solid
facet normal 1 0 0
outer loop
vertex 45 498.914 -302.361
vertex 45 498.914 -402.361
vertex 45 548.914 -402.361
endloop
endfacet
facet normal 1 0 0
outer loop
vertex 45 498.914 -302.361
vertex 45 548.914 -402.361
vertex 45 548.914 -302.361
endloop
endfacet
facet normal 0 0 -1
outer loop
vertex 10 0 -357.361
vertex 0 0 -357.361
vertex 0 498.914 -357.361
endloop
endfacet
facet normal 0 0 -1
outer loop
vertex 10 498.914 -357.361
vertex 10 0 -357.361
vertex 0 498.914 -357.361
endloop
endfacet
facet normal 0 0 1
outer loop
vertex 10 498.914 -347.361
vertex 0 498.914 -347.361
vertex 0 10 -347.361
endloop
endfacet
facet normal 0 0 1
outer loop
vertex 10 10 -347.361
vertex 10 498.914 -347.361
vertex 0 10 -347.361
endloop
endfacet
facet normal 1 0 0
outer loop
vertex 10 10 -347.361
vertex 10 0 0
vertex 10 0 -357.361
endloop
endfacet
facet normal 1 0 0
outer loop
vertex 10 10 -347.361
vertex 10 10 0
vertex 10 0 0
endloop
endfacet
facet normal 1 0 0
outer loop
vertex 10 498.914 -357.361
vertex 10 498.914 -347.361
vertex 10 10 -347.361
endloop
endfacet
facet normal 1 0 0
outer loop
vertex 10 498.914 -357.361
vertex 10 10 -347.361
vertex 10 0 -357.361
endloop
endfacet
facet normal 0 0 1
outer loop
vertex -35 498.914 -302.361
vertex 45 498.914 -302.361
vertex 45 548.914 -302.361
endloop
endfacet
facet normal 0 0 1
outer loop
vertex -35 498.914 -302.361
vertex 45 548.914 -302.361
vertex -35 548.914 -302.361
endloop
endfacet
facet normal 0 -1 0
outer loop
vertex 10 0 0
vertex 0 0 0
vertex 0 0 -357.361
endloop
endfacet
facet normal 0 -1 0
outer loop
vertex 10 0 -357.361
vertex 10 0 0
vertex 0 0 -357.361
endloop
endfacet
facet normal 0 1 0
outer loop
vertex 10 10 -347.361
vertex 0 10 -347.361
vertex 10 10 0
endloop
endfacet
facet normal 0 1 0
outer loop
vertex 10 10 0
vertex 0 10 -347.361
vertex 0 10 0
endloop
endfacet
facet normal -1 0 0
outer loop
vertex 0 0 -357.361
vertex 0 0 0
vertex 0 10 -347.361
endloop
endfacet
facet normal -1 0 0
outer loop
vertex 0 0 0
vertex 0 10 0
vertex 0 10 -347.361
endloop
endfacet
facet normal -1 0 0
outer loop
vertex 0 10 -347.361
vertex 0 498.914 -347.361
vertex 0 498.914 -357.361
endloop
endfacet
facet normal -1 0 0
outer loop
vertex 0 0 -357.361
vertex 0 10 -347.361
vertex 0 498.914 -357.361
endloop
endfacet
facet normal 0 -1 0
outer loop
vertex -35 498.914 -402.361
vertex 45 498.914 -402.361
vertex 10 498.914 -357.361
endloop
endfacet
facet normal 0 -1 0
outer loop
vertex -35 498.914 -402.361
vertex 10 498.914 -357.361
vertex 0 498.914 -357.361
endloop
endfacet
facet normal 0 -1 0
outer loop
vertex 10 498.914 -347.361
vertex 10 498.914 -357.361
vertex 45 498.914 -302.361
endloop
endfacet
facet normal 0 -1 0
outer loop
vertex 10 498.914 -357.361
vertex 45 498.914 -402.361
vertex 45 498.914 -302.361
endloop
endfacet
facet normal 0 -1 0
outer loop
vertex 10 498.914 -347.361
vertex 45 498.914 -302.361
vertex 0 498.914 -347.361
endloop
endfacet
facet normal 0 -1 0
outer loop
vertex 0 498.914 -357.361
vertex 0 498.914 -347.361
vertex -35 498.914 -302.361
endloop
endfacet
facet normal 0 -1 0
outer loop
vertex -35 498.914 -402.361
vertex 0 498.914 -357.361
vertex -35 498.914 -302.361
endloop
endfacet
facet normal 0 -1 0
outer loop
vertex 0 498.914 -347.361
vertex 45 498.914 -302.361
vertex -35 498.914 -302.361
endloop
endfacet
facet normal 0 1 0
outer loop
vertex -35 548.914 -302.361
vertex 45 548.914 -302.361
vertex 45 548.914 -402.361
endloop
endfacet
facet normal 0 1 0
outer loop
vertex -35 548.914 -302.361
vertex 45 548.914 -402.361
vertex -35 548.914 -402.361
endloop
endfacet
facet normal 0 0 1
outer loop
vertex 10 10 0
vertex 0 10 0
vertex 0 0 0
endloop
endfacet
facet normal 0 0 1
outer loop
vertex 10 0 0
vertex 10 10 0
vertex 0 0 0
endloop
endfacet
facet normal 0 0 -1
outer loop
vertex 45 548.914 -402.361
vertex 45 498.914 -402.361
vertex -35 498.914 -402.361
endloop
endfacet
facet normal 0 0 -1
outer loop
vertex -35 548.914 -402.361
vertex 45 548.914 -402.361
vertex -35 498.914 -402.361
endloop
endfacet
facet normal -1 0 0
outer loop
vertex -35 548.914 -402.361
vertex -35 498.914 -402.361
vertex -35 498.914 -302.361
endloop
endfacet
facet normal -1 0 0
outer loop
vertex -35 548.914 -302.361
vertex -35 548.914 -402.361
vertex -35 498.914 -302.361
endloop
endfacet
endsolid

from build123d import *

# Parameters (mm, degrees)
EXTRUDE1_DEPTH = 10
SKETCH2_W      = 80
SKETCH2_H      = 100
EXTRUDE2_DEPTH = 50


with BuildPart() as part:
    # Sketch1 → Extrude1 (new body)
    with BuildSketch(Plane(origin=(0, 0, 0), x_dir=(0, 0, -1), z_dir=(1, 0, 0))):
        Polygon((0, 0), (357.360716499, 0), (357.360716499, 498.914273257), (347.360716499, 498.914273257), (347.360716499, 10), (0, 10), align=None)
    extrude(amount=EXTRUDE1_DEPTH)

    # Sketch2 → Extrude2 (add)
    with BuildSketch(Plane(origin=(0, 498.914273257, 0), x_dir=(-1, 0, 0), z_dir=(0, 1, 0))):
        with Locations((-5, -352.360716499)):
            Rectangle(SKETCH2_W, SKETCH2_H)
    extrude(amount=EXTRUDE2_DEPTH)


solid = part.part
